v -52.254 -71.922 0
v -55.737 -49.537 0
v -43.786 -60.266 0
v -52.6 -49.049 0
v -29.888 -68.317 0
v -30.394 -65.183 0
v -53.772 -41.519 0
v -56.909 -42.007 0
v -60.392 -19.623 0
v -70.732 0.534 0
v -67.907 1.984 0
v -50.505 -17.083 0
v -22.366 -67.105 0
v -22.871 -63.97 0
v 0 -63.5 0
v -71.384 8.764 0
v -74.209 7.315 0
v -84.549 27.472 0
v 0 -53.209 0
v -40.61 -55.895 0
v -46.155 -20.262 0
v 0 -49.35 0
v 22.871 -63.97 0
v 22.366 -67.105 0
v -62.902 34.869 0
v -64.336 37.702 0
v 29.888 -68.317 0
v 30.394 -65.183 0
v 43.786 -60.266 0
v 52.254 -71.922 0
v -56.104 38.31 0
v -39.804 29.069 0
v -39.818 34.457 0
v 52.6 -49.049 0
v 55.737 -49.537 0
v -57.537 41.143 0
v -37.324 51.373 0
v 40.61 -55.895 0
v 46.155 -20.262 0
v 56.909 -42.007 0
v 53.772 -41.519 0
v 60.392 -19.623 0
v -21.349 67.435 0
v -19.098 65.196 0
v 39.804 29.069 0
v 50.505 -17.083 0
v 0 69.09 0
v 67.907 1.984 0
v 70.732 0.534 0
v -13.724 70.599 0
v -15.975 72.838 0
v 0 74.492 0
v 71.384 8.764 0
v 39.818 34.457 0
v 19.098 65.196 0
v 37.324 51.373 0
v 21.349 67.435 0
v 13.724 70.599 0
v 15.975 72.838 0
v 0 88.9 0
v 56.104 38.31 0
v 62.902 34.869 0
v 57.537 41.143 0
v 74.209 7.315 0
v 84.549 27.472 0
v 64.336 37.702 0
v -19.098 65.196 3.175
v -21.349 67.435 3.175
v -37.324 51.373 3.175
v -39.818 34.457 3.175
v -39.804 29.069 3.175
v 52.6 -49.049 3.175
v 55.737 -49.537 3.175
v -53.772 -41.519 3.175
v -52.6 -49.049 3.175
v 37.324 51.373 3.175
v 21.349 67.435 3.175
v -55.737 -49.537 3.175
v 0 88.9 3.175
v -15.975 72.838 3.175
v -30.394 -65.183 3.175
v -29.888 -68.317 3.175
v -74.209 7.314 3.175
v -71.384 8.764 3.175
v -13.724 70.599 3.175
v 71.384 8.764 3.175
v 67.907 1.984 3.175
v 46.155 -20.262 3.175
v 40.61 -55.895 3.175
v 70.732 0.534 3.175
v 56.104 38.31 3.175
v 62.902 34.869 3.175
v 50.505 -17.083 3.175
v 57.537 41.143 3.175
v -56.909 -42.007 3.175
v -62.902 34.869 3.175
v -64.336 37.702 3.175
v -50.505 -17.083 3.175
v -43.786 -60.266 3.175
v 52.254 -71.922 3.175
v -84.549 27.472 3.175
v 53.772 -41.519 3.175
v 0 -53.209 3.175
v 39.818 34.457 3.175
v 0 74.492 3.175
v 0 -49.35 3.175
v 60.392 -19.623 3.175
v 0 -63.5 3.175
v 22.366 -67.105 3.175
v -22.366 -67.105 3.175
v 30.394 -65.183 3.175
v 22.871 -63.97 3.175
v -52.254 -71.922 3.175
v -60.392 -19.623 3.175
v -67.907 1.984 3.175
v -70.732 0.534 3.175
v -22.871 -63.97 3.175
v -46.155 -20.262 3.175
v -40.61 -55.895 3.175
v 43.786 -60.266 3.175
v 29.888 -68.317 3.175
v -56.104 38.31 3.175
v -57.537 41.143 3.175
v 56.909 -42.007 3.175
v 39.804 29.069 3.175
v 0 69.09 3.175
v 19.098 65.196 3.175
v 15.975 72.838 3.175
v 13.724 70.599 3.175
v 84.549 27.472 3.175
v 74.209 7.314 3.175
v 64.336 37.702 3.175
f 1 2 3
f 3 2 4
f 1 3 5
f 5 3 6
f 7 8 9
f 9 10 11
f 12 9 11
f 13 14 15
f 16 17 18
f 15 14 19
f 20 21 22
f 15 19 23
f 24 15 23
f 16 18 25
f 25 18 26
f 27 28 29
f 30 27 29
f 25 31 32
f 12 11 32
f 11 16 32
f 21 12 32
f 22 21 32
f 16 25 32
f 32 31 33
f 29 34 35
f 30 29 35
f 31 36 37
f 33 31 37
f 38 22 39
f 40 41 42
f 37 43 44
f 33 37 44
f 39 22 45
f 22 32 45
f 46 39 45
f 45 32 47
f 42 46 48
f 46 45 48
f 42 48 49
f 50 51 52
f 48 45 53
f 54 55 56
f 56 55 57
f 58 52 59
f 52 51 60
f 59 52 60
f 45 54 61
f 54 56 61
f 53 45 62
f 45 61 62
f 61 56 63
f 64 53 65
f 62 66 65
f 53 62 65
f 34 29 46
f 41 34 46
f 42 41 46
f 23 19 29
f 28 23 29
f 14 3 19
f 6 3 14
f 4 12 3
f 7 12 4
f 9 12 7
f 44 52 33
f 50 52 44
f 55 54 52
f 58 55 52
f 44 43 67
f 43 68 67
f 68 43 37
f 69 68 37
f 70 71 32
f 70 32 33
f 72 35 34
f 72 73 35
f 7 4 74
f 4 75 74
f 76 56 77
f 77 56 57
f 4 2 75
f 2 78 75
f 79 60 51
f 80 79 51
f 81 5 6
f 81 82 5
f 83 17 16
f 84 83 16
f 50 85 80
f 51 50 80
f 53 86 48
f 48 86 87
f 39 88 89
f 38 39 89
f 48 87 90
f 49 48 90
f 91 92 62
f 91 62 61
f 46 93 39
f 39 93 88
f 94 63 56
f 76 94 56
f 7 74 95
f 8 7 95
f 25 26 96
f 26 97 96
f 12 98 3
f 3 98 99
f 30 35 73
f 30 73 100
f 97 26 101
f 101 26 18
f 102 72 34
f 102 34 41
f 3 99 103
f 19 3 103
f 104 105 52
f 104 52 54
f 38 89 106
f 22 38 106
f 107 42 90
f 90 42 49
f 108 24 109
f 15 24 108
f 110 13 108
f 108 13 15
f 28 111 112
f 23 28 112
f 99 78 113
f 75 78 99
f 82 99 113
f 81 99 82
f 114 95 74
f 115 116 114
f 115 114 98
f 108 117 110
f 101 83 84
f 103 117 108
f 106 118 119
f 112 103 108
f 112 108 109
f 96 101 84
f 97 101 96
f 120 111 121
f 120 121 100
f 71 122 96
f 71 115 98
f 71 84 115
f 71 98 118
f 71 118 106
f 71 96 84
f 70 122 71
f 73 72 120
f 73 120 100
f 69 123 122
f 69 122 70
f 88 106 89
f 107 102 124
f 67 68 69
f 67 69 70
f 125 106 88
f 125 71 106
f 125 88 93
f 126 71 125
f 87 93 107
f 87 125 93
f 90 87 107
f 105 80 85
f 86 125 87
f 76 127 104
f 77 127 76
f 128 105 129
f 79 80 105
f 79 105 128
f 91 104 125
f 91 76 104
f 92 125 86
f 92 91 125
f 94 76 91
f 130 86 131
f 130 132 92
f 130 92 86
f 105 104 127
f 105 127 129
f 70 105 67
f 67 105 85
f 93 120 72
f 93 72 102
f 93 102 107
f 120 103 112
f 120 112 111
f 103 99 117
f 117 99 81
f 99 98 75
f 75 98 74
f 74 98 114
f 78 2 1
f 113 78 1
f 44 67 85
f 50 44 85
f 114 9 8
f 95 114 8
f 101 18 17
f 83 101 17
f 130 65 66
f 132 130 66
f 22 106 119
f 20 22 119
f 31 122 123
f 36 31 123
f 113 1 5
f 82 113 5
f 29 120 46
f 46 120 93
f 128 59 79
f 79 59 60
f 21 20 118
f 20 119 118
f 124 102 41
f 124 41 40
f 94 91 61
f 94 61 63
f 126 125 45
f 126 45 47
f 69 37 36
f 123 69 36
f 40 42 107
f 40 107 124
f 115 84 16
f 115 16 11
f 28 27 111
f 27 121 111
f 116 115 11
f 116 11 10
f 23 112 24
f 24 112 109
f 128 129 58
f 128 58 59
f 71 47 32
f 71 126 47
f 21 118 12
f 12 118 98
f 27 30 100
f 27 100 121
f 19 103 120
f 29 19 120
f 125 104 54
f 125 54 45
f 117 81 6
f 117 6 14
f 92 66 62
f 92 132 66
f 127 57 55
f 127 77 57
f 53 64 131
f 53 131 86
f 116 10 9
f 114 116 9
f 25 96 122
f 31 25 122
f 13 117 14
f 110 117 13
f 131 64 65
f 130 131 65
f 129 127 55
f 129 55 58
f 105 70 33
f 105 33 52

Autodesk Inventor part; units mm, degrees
ref_plane "YZ Plane" through (0, 0, 0) normal (1, 0, 0) x (0, 1, 0)
ref_plane "XZ Plane" through (0, 0, 0) normal (0, 1, 0) x (-1, 0, 0)
ref_plane "XY Plane" through (0, 0, 0) normal (0, 0, 1) x (1, 0, 0)
sketch "Sketch1" plane through (0, 0, 0) normal (0, 0, 1) x (1, 0, 0)
  circle A0 centre (0, 0) radius 63.5 construction
  circle A1 centre (0, 0) radius 88.9 construction
  line L0 (0, 88.9) -> (-37.3244, 51.3726)
  line L1 (-37.3244, 51.3726) -> (-84.5489, 27.4716)
  line L2 (-84.5489, 27.4716) -> (-60.3921, -19.6226)
  line L3 (-60.3921, -19.6226) -> (-52.2541, -71.9216)
  line L4 (-52.2541, -71.9216) -> (0, -63.5)
  line L5 (52.2541, -71.9216) -> (0, -63.5)
  line L6 (60.3921, -19.6226) -> (52.2541, -71.9216)
  line L7 (60.3921, -19.6226) -> (84.5489, 27.4716)
  line L8 (84.5489, 27.4716) -> (37.3244, 51.3726)
  line L9 (37.3244, 51.3726) -> (0, 88.9)
  dimension "d0" = 127
  dimension "d1" = 177.8
  dimension "d4" = 360
  dimension "d8" = 360
extrude "Extrusion1" add sketch "Sketch1" along normal blind 3.175
sketch "Sketch2" plane through (0, 0, 3.175) normal (0, 0, 1) x (1, 0, 0)
  line L0 (37.3244, 51.3726) -> (0, 88.9) projected
  line L1 (84.5489, 27.4716) -> (37.3244, 51.3726) projected
  line L2 (60.3921, -19.6226) -> (84.5489, 27.4716) projected
  line L3 (52.2541, -71.9216) -> (60.3921, -19.6226) projected
  line L4 (0, -63.5) -> (52.2541, -71.9216) projected
  line L5 (-21.3489, 67.4349) -> (-19.0978, 65.1959)
  line L6 (-19.0978, 65.1959) -> (-13.7243, 70.5987)
  line L7 (-13.7243, 70.5987) -> (-15.9754, 72.8377)
  line L8 (-21.3489, 67.4349) -> (-15.9754, 72.8377)
  line L9 (0, 70.1363) -> (0, 60.325) construction
  line L10 (21.3489, 67.4349) -> (19.0978, 65.1959)
  line L11 (19.0978, 65.1959) -> (13.7243, 70.5987)
  line L12 (13.7243, 70.5987) -> (15.9754, 72.8377)
  line L13 (21.3489, 67.4349) -> (15.9754, 72.8377)
  line L14 (-64.3361, 37.7016) -> (-62.9023, 34.8688)
  line L15 (-62.9023, 34.8688) -> (-56.1035, 38.3097)
  line L16 (-56.1035, 38.3097) -> (-57.5372, 41.1426)
  line L17 (0, 0) -> (-84.5489, 27.4716) construction
  line L18 (-64.3361, 37.7016) -> (-57.5372, 41.1426)
  line L19 (-74.2094, 7.3145) -> (-71.3844, 8.7636)
  line L20 (-71.3844, 8.7636) -> (-67.9066, 1.9836)
  line L21 (-67.9066, 1.9836) -> (-70.7316, 0.5345)
  line L22 (-74.2094, 7.3145) -> (-70.7316, 0.5345)
  line L23 (-56.9089, -42.0074) -> (-55.7373, -49.5368)
  line L24 (-55.7373, -49.5368) -> (-52.6, -49.0486)
  line L25 (-52.6, -49.0486) -> (-53.7717, -41.5192)
  line L26 (-53.7717, -41.5192) -> (-56.9089, -42.0074)
  line L27 (-52.2541, -71.9216) -> (0, 0) construction
  line L28 (-22.3656, -67.1046) -> (-29.8885, -68.317)
  line L29 (-29.8885, -68.317) -> (-30.3937, -65.1825)
  line L30 (-30.3937, -65.1825) -> (-22.8708, -63.97)
  line L31 (-22.8708, -63.97) -> (-22.3656, -67.1046)
  line L32 (64.3361, 37.7016) -> (62.9023, 34.8688)
  line L33 (62.9023, 34.8688) -> (56.1035, 38.3097)
  line L34 (56.1035, 38.3097) -> (57.5372, 41.1426)
  line L35 (64.3361, 37.7016) -> (57.5372, 41.1426)
  line L36 (71.3844, 8.7636) -> (67.9066, 1.9836)
  line L37 (67.9066, 1.9836) -> (70.7316, 0.5345)
  line L38 (74.2094, 7.3145) -> (70.7316, 0.5345)
  line L39 (74.2094, 7.3145) -> (71.3844, 8.7636)
  line L40 (56.9089, -42.0074) -> (55.7373, -49.5368)
  line L41 (55.7373, -49.5368) -> (52.6, -49.0486)
  line L42 (52.6, -49.0486) -> (53.7717, -41.5192)
  line L43 (53.7717, -41.5192) -> (56.9089, -42.0074)
  line L44 (29.8885, -68.317) -> (30.3937, -65.1825)
  line L45 (22.3656, -67.1046) -> (29.8885, -68.317)
  line L46 (30.3937, -65.1825) -> (22.8708, -63.97)
  line L47 (22.8708, -63.97) -> (22.3656, -67.1046)
  line L48 (-37.3244, 51.3726) -> (-84.5489, 27.4716) projected
  line L49 (0, 88.9) -> (-37.3244, 51.3726) projected
  line L50 (-84.5489, 27.4716) -> (-60.3921, -19.6226) projected
  line L51 (-60.3921, -19.6226) -> (-52.2541, -71.9216) projected
  line L52 (-52.2541, -71.9216) -> (0, -63.5) projected
  point P0 (-18.6622, 70.1363)
  point P1 (18.6622, 70.1363)
  point P2 (60.9366, 39.4221)
  point P3 (72.4705, 3.9245)
  point P4 (56.3231, -45.7721)
  point P5 (-56.3231, -45.7721)
  point P6 (-72.4705, 3.9245)
  point P7 (-60.9366, 39.4221)
  point P8 (-26.1271, -67.7108)
  point P9 (26.1271, -67.7108)
  dimension "d12" = 3.81
  dimension "d13" = 3.81
  dimension "d14" = 3.175
  dimension "d15" = 3.81
  dimension "d16" = 7.62
  dimension "d18" = 3.81
extrude "Extrusion2" cut sketch "Sketch2" against normal blind 25.4 contours L10 L11 L12 L0 | L1 L32 L33 L34 | L7 L6 L5 L8 | L2 L37 L36 L39 | L16 L15 L14 L18 | L3 L41 L42 L43 | L19 L20 L21 L22 | L4 L47 L46 L44 | L26 L25 L24 L23 | L28 L29 L30 L31
sketch "Sketch3" plane through (0, 0, 0) normal (1, 0, 0) x (0, 1, 0)
  line L0 (0, 3.175) -> (0, 185.8962) construction
  line L1 (88.9, 0) -> (88.9, 3.175) projected
  point P0 (0, 0)
  point P1 (0.5345, 3.175)
  dimension "d22" = 88.9
  dimension "d23" = 182.7212
sketch "Sketch4" plane through (0, 0, 3.175) normal (0, 0, 1) x (1, 0, 0)
  line L0 (-39.8185, 34.4573) -> (0, 74.4925)
  line L1 (0, 74.4925) -> (39.8185, 34.4573)
  line L2 (39.8185, 34.4573) -> (39.8039, 29.0692)
  line L3 (39.8039, 29.0692) -> (0, 69.0896)
  line L4 (0, 69.0896) -> (-39.8039, 29.0692)
  line L5 (-39.8039, 29.0692) -> (-39.8185, 34.4573)
  line L6 (-21.3489, 67.4349) -> (-37.3244, 51.3726) projected
  line L7 (37.3244, 51.3726) -> (21.3489, 67.4349) projected
  line L8 (-50.5051, -17.0826) -> (-43.7856, -60.2657)
  line L9 (-43.7856, -60.2657) -> (0, -53.2089)
  line L10 (0, -53.2089) -> (43.7856, -60.2657)
  line L11 (43.7856, -60.2657) -> (50.5051, -17.0826)
  line L12 (50.5051, -17.0826) -> (46.1546, -20.2615)
  line L13 (46.1546, -20.2615) -> (40.6099, -55.8947)
  line L14 (40.6099, -55.8947) -> (0, -49.3497)
  line L15 (0, -49.3497) -> (-40.6099, -55.8947)
  line L16 (-40.6099, -55.8947) -> (-46.1546, -20.2615)
  line L17 (-46.1546, -20.2615) -> (-50.5051, -17.0826)
  line L18 (-55.7373, -49.5368) -> (-52.2541, -71.9216) projected
  line L19 (52.2541, -71.9216) -> (55.7373, -49.5368) projected
  line L20 (29.8885, -68.317) -> (52.2541, -71.9216) projected
  line L21 (0, -63.5) -> (22.3656, -67.1046) projected
  line L22 (-22.3656, -67.1046) -> (0, -63.5) projected
  line L23 (-52.2541, -71.9216) -> (-29.8885, -68.317) projected
  line L24 (-37.3244, 51.3726) -> (-57.5372, 41.1426) projected
  point P0 (0, 0)
  point P1 (-60.3921, -19.6226)
  point P2 (60.3921, -19.6226)
  dimension "d24" = 3.81
  dimension "d26" = 10.16
  dimension "d27" = 10.16
  dimension "d29" = 3.81
  dimension "d30" = 2.54
  dimension "d32" = 2.54
  dimension "d33" = 3.81
  dimension "d34" = 3.81
  dimension "d35" = 3.81
  dimension "d36" = 3.81
  dimension "d37" = 10.16
  dimension "d38" = 10.16
  dimension "d39" = 10.16
  dimension "d40" = 10.16
  dimension "d44" = 45
  dimension "d45" = 45
  dimension "d46" = 45
  dimension "d47" = 45
  dimension "d48" = 2.54
  dimension "d50" = 2.54
extrude "Extrusion3" cut sketch "Sketch4" against normal blind 25.4
properties part number "Star Base" material "Wood (Birch)"
